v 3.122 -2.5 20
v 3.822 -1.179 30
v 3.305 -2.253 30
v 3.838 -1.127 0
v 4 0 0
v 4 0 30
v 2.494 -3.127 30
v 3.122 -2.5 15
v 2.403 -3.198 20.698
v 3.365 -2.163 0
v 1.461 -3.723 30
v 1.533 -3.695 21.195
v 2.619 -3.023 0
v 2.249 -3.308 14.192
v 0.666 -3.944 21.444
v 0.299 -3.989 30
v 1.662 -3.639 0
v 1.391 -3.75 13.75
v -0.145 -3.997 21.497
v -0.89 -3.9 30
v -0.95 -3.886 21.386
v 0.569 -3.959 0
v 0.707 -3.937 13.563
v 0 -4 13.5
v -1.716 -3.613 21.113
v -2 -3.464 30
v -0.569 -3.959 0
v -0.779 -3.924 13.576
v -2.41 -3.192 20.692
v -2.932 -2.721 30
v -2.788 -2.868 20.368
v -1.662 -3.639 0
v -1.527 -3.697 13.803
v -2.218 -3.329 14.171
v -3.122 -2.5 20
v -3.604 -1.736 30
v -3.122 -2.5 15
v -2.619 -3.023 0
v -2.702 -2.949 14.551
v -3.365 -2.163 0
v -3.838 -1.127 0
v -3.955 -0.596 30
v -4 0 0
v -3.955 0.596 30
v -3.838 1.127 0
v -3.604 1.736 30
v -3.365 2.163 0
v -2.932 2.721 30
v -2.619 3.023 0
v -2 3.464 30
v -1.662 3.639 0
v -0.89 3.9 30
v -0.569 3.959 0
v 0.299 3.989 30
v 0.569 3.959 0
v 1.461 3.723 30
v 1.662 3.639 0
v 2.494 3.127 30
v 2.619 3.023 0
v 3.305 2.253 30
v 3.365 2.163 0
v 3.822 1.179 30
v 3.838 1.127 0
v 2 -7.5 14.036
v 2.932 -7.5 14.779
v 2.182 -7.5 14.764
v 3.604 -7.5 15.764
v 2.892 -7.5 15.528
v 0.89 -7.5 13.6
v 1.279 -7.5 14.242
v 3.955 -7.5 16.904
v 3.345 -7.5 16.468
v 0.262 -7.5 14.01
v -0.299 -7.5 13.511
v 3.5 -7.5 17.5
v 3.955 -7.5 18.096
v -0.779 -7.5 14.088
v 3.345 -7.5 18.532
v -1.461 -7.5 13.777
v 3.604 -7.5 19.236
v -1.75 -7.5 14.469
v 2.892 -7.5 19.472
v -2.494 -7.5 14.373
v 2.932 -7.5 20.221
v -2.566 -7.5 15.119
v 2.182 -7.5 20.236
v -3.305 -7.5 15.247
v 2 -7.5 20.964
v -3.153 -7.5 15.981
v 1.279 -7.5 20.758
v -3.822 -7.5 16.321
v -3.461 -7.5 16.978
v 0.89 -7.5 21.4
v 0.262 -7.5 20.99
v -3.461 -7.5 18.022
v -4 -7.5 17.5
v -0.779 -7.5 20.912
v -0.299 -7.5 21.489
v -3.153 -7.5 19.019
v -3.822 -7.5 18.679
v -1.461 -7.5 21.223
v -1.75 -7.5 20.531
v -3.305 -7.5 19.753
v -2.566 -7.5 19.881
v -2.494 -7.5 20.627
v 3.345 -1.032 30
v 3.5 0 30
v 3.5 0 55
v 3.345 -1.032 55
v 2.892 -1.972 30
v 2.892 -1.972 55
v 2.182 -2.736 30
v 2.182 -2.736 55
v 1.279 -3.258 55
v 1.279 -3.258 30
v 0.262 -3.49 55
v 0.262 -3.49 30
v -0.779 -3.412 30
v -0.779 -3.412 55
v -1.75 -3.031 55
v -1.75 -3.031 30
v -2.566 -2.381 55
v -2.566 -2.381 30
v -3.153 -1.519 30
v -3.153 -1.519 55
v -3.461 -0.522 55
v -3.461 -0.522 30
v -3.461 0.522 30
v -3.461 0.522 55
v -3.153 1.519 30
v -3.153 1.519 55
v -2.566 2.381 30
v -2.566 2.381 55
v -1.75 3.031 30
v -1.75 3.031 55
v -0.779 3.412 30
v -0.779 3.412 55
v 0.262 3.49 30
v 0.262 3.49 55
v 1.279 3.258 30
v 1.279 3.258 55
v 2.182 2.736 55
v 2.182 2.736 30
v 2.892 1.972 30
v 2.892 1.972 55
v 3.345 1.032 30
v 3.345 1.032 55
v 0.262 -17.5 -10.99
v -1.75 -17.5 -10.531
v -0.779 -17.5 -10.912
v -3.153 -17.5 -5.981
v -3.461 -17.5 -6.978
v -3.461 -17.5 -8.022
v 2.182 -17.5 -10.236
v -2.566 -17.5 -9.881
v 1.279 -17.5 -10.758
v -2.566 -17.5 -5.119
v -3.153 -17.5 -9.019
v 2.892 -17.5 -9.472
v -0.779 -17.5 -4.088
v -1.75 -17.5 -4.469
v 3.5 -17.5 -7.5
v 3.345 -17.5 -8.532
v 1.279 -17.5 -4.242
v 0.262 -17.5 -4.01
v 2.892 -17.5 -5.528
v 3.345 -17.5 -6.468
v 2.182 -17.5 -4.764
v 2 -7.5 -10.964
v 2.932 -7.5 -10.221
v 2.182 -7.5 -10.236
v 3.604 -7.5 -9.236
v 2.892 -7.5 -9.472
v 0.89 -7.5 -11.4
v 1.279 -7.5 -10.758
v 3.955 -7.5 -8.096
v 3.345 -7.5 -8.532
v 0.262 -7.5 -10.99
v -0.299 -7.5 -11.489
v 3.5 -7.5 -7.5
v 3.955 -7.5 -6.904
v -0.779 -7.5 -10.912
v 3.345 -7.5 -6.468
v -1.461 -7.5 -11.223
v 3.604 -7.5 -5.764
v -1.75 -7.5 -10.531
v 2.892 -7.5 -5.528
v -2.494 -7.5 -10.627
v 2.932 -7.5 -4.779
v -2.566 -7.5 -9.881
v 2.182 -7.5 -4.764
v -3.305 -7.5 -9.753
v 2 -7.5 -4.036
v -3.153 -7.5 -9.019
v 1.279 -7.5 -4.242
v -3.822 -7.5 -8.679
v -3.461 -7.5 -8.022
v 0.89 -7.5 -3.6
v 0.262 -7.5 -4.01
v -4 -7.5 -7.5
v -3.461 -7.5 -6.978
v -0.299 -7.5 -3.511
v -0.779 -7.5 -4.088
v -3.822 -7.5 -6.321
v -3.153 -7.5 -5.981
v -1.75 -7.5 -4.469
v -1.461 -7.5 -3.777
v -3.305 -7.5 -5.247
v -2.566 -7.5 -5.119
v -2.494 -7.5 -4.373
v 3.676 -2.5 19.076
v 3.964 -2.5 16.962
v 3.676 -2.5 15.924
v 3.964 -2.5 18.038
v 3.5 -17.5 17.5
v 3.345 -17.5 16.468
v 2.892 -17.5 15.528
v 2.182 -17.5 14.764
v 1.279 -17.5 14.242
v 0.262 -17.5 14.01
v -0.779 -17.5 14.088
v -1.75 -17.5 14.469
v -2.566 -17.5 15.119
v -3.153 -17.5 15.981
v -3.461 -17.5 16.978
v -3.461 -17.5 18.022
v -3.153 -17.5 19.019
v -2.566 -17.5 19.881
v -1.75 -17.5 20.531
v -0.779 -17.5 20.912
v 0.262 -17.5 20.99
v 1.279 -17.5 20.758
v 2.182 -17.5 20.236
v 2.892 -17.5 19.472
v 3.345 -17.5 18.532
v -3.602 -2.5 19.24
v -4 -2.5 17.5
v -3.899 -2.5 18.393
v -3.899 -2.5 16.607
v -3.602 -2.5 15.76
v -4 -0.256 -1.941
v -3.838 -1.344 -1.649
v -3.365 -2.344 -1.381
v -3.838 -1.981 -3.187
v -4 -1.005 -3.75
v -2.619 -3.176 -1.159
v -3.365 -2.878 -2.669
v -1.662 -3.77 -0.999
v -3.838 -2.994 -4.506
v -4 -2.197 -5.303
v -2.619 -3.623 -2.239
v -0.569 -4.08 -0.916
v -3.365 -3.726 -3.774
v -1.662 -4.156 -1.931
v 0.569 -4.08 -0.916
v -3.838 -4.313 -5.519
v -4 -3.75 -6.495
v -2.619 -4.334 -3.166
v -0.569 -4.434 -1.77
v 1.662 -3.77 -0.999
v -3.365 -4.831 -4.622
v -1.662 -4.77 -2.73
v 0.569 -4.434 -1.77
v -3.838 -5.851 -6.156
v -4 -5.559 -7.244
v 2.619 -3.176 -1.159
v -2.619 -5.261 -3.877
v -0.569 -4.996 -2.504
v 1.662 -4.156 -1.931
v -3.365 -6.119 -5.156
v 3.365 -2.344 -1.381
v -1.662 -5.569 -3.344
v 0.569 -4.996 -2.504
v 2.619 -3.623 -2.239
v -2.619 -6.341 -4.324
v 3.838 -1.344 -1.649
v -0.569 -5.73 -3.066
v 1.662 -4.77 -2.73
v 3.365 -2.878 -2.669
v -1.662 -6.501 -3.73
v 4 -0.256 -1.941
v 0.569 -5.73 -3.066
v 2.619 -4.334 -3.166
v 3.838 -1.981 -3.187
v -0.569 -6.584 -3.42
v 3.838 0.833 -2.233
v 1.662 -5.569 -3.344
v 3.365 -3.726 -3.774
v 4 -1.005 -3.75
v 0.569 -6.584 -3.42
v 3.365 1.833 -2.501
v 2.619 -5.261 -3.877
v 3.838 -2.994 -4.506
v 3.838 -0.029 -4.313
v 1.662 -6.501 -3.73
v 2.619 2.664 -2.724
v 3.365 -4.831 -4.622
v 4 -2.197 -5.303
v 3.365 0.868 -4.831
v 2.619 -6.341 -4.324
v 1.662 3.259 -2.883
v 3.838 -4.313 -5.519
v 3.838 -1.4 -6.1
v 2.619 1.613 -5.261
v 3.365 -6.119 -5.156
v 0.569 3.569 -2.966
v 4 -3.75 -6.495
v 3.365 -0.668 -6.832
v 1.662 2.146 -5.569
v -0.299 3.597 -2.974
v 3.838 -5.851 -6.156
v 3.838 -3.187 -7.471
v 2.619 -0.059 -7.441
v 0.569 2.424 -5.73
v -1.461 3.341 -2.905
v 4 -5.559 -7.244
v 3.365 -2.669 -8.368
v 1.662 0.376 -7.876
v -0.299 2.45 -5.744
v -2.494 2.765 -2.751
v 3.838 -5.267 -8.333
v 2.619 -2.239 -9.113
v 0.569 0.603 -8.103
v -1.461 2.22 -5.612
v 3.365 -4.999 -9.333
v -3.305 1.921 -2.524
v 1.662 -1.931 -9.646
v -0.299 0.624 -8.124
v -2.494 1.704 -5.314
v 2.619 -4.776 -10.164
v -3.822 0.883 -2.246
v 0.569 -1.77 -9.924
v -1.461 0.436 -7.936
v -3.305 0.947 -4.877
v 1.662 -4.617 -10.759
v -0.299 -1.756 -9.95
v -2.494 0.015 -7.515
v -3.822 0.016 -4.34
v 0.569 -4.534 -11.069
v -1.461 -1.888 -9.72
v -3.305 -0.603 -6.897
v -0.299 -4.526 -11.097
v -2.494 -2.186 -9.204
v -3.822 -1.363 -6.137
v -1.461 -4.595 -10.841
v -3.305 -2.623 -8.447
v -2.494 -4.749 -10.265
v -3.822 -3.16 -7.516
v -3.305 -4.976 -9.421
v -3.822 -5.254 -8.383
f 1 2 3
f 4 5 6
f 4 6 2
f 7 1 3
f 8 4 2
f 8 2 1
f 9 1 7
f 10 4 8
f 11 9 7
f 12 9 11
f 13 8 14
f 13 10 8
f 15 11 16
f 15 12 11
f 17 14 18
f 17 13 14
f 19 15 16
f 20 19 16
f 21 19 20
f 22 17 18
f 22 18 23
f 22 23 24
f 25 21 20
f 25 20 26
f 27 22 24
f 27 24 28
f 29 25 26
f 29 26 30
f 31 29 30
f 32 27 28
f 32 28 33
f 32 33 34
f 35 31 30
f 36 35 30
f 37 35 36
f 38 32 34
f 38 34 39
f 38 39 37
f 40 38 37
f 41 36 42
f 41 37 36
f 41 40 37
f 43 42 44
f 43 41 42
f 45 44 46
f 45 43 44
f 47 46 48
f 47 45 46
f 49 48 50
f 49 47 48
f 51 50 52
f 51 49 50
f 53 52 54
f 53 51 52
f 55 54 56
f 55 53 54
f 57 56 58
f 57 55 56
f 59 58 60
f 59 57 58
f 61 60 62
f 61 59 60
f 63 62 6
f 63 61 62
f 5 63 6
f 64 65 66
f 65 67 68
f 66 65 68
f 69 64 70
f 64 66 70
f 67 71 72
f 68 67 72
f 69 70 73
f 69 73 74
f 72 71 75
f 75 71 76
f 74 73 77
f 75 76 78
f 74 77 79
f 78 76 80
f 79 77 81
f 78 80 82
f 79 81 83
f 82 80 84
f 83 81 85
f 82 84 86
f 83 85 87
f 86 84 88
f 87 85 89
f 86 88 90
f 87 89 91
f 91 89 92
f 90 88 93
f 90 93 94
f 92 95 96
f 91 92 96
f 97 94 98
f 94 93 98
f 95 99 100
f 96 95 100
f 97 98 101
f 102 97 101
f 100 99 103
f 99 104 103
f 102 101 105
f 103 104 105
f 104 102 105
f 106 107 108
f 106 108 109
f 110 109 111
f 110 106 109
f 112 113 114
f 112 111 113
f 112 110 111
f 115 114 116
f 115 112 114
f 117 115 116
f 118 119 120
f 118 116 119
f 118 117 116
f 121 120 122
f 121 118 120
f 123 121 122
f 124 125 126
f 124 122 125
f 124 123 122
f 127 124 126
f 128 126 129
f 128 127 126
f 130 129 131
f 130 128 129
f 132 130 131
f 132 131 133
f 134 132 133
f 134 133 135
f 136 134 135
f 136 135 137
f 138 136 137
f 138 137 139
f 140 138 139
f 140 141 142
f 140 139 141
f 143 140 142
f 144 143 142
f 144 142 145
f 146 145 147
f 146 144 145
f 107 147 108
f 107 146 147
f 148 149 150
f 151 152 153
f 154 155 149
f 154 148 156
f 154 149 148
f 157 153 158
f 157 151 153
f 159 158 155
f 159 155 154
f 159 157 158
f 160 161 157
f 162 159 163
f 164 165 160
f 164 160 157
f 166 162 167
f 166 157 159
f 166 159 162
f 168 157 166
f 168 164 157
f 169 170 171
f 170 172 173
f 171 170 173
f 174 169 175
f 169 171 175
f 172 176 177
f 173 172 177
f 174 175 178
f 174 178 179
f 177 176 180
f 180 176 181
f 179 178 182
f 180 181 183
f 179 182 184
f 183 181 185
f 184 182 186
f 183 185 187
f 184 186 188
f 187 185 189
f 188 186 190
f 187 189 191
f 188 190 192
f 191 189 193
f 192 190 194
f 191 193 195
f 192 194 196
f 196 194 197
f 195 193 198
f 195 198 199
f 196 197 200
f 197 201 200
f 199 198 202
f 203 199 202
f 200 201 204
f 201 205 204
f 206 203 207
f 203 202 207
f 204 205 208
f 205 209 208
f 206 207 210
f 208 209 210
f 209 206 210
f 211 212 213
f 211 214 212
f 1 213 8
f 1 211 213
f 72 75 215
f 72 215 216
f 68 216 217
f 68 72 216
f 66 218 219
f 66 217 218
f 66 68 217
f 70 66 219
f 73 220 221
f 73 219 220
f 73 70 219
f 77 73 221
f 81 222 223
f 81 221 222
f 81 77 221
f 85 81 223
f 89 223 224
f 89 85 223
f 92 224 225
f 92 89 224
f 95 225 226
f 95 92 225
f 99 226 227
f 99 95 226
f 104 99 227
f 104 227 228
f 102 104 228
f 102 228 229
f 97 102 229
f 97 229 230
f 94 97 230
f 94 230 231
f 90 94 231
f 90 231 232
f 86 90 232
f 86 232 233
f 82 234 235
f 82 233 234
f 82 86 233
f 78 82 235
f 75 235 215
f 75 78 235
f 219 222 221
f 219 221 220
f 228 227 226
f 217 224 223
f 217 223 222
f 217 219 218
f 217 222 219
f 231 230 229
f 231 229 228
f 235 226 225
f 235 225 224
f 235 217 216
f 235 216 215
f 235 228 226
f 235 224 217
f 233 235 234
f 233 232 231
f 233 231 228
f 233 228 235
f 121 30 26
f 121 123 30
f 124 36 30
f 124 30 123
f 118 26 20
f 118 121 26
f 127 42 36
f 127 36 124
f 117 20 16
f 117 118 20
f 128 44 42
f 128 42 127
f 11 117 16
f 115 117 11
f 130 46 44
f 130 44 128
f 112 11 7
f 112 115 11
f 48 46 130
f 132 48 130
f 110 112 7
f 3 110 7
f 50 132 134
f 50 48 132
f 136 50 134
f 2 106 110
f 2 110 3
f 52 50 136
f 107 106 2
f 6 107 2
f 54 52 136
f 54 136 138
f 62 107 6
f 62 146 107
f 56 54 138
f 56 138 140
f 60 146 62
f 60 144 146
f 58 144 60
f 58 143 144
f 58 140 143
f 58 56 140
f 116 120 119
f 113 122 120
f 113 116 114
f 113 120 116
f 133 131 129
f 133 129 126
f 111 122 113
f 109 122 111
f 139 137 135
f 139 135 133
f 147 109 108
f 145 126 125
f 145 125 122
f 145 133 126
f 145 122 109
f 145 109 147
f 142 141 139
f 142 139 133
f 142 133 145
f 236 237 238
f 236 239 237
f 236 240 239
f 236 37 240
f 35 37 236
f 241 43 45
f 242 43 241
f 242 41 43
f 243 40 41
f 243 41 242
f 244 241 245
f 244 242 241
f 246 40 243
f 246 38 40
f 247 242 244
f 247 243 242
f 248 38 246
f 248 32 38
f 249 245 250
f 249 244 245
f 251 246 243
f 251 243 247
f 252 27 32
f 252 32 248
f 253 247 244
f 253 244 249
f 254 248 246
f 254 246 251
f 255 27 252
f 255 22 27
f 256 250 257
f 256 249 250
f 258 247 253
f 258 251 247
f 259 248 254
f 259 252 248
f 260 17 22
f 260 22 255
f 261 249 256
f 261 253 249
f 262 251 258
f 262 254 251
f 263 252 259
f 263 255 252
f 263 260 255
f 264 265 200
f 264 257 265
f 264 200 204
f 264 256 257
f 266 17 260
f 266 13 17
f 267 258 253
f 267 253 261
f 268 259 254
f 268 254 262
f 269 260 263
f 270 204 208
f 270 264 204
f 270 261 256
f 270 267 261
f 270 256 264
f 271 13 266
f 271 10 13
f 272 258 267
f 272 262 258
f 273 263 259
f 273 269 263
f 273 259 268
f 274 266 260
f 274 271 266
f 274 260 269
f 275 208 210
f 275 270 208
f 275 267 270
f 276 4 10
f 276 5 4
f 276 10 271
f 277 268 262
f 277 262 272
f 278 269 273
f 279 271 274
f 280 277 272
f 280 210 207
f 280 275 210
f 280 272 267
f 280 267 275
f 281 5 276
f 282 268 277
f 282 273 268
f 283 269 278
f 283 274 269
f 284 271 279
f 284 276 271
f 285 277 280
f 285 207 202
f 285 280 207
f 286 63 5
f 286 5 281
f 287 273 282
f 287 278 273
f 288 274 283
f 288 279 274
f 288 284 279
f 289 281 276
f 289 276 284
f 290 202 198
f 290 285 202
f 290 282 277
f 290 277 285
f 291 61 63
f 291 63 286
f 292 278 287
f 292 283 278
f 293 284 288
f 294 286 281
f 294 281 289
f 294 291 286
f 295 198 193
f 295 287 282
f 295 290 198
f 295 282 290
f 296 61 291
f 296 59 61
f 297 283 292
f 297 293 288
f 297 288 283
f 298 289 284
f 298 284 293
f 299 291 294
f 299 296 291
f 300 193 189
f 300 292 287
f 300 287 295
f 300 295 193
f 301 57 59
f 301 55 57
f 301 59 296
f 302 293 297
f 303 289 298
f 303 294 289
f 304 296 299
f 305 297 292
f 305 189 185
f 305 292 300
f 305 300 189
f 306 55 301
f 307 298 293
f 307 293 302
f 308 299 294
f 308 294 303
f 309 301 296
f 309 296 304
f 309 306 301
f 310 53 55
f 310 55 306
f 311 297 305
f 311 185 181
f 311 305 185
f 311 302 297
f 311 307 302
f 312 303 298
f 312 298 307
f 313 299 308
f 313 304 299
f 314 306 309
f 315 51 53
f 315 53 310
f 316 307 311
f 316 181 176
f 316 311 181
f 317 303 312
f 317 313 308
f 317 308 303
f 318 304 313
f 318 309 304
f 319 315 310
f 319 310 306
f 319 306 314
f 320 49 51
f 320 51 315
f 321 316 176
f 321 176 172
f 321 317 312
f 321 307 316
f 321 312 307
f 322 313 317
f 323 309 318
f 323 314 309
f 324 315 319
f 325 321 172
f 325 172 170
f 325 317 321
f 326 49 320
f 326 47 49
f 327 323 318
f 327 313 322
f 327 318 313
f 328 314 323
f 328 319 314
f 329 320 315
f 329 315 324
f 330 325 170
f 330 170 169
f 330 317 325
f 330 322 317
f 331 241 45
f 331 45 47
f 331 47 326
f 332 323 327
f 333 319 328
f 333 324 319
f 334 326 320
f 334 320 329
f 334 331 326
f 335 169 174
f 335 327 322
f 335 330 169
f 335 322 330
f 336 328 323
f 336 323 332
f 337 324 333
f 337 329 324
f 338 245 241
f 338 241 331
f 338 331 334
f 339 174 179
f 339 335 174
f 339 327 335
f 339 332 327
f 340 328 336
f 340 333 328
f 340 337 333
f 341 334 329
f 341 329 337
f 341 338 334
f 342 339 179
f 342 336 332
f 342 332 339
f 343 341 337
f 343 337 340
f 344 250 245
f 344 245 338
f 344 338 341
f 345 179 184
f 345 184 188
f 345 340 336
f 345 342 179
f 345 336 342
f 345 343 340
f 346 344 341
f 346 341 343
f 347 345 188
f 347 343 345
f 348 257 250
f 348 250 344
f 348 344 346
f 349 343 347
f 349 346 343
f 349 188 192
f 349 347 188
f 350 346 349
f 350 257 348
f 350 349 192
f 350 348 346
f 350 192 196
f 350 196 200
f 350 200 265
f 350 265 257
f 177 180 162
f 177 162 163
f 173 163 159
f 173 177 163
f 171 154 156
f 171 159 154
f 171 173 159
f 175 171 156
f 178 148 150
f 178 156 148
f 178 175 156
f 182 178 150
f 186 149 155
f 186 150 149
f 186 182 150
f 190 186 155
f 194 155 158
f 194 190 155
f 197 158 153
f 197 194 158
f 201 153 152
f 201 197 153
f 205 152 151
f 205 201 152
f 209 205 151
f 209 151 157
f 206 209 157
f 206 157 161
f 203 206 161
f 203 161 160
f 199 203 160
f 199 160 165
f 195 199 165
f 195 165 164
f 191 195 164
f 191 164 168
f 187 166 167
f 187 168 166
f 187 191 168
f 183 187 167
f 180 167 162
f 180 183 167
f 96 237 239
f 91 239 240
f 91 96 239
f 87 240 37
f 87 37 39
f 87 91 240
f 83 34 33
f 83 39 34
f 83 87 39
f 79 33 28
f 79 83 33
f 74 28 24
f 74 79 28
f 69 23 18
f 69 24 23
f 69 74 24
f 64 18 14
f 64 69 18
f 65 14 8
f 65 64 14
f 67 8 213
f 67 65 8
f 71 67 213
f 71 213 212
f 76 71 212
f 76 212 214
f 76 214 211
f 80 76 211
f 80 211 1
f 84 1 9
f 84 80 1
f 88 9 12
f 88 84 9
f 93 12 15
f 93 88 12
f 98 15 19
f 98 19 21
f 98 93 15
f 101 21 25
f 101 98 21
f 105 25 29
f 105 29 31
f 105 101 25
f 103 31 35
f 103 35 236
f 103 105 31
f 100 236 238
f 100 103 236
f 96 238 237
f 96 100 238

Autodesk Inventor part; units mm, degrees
ref_plane "YZ Plane" through (0, 0, 0) normal (1, 0, 0) x (0, 1, 0)
sketch "Sketch2" plane through (0, 0, 0) normal (0, 0, 1) x (1, 0, 0)
  circle A0 centre (0, 0) radius 4
  dimension "d0" = 8
ref_plane "Work Plane1" through (0, -7.5, 0) normal (0, 1, 0) x (-1, 0, 0)
sketch "Sketch3" plane through (0, -7.5, 0) normal (0, 1, 0) x (-1, 0, 0)
  circle A0 centre (0, -7.5) radius 4
  line L0 (5.6, 0) -> (-5.6, 0) projected
  point P0 (0, 0)
  dimension "d2" = 8
  dimension "d3" = 7.5
revolve "Revolution1" add sketch "Sketch3" angle 90 about axis through (-10, -7.5, 0) along (1, 0, 0)
extrude "Extrusion1" add sketch "Sketch2" along normal blind 17.5
sketch "Sketch4" plane through (0, 0, 17.5) normal (0, 0, 1) x (1, 0, 0)
  circle A0 centre (0, 0) radius 4
  dimension "d7" = 8
ref_plane "Work Plane2" through (0, 0, 17.5) normal (0, 0, 1) x (1, 0, 0)
extrude "Extrusion2" add sketch "Sketch4" along normal blind 12.5
sketch "Sketch5" plane through (0, -7.5, 0) normal (0, 1, 0) x (-1, 0, 0)
  circle A0 centre (0, 17.5) radius 4
  line L0 (-10.5, 17.5) -> (10.5, 17.5) projected
  point P0 (0, 0)
  dimension "d11" = 8
  dimension "d12" = 0
extrude "Extrusion3" add sketch "Sketch5" along normal blind 5
sketch "Sketch7" plane through (0, -7.5, -7.5) normal (0, -1, 0) x (1, 0, 0)
  circle A0 centre (0, 0) radius 3.5
  point P0 (0, 7.5)
  dimension "d18" = 7
extrude "Extrusion4" add sketch "Sketch7" along normal blind 10
sketch "Sketch8" plane through (0, -7.5, 0) normal (0, -1, 0) x (1, 0, 0)
  circle A0 centre (0, 17.5) radius 3.5
  circle A1 centre (0, -7.5) radius 3.5 projected
  point P0 (0, 0)
  dimension "d21" = 7
  dimension "d22" = 25
extrude "Extrusion5" add sketch "Sketch8" along normal blind 10 contours A0
sketch "Sketch10" plane through (0, 0, 30) normal (0, 0, 1) x (1, 0, 0)
  circle A0 centre (0, 0) radius 4 projected
  circle A1 centre (0, 0) radius 3.5
  dimension "d29" = 7
extrude "Extrusion7" add sketch "Sketch10" along normal mid plane 50 contours A1
properties part number "1p10 DP3 roller attachment final"
